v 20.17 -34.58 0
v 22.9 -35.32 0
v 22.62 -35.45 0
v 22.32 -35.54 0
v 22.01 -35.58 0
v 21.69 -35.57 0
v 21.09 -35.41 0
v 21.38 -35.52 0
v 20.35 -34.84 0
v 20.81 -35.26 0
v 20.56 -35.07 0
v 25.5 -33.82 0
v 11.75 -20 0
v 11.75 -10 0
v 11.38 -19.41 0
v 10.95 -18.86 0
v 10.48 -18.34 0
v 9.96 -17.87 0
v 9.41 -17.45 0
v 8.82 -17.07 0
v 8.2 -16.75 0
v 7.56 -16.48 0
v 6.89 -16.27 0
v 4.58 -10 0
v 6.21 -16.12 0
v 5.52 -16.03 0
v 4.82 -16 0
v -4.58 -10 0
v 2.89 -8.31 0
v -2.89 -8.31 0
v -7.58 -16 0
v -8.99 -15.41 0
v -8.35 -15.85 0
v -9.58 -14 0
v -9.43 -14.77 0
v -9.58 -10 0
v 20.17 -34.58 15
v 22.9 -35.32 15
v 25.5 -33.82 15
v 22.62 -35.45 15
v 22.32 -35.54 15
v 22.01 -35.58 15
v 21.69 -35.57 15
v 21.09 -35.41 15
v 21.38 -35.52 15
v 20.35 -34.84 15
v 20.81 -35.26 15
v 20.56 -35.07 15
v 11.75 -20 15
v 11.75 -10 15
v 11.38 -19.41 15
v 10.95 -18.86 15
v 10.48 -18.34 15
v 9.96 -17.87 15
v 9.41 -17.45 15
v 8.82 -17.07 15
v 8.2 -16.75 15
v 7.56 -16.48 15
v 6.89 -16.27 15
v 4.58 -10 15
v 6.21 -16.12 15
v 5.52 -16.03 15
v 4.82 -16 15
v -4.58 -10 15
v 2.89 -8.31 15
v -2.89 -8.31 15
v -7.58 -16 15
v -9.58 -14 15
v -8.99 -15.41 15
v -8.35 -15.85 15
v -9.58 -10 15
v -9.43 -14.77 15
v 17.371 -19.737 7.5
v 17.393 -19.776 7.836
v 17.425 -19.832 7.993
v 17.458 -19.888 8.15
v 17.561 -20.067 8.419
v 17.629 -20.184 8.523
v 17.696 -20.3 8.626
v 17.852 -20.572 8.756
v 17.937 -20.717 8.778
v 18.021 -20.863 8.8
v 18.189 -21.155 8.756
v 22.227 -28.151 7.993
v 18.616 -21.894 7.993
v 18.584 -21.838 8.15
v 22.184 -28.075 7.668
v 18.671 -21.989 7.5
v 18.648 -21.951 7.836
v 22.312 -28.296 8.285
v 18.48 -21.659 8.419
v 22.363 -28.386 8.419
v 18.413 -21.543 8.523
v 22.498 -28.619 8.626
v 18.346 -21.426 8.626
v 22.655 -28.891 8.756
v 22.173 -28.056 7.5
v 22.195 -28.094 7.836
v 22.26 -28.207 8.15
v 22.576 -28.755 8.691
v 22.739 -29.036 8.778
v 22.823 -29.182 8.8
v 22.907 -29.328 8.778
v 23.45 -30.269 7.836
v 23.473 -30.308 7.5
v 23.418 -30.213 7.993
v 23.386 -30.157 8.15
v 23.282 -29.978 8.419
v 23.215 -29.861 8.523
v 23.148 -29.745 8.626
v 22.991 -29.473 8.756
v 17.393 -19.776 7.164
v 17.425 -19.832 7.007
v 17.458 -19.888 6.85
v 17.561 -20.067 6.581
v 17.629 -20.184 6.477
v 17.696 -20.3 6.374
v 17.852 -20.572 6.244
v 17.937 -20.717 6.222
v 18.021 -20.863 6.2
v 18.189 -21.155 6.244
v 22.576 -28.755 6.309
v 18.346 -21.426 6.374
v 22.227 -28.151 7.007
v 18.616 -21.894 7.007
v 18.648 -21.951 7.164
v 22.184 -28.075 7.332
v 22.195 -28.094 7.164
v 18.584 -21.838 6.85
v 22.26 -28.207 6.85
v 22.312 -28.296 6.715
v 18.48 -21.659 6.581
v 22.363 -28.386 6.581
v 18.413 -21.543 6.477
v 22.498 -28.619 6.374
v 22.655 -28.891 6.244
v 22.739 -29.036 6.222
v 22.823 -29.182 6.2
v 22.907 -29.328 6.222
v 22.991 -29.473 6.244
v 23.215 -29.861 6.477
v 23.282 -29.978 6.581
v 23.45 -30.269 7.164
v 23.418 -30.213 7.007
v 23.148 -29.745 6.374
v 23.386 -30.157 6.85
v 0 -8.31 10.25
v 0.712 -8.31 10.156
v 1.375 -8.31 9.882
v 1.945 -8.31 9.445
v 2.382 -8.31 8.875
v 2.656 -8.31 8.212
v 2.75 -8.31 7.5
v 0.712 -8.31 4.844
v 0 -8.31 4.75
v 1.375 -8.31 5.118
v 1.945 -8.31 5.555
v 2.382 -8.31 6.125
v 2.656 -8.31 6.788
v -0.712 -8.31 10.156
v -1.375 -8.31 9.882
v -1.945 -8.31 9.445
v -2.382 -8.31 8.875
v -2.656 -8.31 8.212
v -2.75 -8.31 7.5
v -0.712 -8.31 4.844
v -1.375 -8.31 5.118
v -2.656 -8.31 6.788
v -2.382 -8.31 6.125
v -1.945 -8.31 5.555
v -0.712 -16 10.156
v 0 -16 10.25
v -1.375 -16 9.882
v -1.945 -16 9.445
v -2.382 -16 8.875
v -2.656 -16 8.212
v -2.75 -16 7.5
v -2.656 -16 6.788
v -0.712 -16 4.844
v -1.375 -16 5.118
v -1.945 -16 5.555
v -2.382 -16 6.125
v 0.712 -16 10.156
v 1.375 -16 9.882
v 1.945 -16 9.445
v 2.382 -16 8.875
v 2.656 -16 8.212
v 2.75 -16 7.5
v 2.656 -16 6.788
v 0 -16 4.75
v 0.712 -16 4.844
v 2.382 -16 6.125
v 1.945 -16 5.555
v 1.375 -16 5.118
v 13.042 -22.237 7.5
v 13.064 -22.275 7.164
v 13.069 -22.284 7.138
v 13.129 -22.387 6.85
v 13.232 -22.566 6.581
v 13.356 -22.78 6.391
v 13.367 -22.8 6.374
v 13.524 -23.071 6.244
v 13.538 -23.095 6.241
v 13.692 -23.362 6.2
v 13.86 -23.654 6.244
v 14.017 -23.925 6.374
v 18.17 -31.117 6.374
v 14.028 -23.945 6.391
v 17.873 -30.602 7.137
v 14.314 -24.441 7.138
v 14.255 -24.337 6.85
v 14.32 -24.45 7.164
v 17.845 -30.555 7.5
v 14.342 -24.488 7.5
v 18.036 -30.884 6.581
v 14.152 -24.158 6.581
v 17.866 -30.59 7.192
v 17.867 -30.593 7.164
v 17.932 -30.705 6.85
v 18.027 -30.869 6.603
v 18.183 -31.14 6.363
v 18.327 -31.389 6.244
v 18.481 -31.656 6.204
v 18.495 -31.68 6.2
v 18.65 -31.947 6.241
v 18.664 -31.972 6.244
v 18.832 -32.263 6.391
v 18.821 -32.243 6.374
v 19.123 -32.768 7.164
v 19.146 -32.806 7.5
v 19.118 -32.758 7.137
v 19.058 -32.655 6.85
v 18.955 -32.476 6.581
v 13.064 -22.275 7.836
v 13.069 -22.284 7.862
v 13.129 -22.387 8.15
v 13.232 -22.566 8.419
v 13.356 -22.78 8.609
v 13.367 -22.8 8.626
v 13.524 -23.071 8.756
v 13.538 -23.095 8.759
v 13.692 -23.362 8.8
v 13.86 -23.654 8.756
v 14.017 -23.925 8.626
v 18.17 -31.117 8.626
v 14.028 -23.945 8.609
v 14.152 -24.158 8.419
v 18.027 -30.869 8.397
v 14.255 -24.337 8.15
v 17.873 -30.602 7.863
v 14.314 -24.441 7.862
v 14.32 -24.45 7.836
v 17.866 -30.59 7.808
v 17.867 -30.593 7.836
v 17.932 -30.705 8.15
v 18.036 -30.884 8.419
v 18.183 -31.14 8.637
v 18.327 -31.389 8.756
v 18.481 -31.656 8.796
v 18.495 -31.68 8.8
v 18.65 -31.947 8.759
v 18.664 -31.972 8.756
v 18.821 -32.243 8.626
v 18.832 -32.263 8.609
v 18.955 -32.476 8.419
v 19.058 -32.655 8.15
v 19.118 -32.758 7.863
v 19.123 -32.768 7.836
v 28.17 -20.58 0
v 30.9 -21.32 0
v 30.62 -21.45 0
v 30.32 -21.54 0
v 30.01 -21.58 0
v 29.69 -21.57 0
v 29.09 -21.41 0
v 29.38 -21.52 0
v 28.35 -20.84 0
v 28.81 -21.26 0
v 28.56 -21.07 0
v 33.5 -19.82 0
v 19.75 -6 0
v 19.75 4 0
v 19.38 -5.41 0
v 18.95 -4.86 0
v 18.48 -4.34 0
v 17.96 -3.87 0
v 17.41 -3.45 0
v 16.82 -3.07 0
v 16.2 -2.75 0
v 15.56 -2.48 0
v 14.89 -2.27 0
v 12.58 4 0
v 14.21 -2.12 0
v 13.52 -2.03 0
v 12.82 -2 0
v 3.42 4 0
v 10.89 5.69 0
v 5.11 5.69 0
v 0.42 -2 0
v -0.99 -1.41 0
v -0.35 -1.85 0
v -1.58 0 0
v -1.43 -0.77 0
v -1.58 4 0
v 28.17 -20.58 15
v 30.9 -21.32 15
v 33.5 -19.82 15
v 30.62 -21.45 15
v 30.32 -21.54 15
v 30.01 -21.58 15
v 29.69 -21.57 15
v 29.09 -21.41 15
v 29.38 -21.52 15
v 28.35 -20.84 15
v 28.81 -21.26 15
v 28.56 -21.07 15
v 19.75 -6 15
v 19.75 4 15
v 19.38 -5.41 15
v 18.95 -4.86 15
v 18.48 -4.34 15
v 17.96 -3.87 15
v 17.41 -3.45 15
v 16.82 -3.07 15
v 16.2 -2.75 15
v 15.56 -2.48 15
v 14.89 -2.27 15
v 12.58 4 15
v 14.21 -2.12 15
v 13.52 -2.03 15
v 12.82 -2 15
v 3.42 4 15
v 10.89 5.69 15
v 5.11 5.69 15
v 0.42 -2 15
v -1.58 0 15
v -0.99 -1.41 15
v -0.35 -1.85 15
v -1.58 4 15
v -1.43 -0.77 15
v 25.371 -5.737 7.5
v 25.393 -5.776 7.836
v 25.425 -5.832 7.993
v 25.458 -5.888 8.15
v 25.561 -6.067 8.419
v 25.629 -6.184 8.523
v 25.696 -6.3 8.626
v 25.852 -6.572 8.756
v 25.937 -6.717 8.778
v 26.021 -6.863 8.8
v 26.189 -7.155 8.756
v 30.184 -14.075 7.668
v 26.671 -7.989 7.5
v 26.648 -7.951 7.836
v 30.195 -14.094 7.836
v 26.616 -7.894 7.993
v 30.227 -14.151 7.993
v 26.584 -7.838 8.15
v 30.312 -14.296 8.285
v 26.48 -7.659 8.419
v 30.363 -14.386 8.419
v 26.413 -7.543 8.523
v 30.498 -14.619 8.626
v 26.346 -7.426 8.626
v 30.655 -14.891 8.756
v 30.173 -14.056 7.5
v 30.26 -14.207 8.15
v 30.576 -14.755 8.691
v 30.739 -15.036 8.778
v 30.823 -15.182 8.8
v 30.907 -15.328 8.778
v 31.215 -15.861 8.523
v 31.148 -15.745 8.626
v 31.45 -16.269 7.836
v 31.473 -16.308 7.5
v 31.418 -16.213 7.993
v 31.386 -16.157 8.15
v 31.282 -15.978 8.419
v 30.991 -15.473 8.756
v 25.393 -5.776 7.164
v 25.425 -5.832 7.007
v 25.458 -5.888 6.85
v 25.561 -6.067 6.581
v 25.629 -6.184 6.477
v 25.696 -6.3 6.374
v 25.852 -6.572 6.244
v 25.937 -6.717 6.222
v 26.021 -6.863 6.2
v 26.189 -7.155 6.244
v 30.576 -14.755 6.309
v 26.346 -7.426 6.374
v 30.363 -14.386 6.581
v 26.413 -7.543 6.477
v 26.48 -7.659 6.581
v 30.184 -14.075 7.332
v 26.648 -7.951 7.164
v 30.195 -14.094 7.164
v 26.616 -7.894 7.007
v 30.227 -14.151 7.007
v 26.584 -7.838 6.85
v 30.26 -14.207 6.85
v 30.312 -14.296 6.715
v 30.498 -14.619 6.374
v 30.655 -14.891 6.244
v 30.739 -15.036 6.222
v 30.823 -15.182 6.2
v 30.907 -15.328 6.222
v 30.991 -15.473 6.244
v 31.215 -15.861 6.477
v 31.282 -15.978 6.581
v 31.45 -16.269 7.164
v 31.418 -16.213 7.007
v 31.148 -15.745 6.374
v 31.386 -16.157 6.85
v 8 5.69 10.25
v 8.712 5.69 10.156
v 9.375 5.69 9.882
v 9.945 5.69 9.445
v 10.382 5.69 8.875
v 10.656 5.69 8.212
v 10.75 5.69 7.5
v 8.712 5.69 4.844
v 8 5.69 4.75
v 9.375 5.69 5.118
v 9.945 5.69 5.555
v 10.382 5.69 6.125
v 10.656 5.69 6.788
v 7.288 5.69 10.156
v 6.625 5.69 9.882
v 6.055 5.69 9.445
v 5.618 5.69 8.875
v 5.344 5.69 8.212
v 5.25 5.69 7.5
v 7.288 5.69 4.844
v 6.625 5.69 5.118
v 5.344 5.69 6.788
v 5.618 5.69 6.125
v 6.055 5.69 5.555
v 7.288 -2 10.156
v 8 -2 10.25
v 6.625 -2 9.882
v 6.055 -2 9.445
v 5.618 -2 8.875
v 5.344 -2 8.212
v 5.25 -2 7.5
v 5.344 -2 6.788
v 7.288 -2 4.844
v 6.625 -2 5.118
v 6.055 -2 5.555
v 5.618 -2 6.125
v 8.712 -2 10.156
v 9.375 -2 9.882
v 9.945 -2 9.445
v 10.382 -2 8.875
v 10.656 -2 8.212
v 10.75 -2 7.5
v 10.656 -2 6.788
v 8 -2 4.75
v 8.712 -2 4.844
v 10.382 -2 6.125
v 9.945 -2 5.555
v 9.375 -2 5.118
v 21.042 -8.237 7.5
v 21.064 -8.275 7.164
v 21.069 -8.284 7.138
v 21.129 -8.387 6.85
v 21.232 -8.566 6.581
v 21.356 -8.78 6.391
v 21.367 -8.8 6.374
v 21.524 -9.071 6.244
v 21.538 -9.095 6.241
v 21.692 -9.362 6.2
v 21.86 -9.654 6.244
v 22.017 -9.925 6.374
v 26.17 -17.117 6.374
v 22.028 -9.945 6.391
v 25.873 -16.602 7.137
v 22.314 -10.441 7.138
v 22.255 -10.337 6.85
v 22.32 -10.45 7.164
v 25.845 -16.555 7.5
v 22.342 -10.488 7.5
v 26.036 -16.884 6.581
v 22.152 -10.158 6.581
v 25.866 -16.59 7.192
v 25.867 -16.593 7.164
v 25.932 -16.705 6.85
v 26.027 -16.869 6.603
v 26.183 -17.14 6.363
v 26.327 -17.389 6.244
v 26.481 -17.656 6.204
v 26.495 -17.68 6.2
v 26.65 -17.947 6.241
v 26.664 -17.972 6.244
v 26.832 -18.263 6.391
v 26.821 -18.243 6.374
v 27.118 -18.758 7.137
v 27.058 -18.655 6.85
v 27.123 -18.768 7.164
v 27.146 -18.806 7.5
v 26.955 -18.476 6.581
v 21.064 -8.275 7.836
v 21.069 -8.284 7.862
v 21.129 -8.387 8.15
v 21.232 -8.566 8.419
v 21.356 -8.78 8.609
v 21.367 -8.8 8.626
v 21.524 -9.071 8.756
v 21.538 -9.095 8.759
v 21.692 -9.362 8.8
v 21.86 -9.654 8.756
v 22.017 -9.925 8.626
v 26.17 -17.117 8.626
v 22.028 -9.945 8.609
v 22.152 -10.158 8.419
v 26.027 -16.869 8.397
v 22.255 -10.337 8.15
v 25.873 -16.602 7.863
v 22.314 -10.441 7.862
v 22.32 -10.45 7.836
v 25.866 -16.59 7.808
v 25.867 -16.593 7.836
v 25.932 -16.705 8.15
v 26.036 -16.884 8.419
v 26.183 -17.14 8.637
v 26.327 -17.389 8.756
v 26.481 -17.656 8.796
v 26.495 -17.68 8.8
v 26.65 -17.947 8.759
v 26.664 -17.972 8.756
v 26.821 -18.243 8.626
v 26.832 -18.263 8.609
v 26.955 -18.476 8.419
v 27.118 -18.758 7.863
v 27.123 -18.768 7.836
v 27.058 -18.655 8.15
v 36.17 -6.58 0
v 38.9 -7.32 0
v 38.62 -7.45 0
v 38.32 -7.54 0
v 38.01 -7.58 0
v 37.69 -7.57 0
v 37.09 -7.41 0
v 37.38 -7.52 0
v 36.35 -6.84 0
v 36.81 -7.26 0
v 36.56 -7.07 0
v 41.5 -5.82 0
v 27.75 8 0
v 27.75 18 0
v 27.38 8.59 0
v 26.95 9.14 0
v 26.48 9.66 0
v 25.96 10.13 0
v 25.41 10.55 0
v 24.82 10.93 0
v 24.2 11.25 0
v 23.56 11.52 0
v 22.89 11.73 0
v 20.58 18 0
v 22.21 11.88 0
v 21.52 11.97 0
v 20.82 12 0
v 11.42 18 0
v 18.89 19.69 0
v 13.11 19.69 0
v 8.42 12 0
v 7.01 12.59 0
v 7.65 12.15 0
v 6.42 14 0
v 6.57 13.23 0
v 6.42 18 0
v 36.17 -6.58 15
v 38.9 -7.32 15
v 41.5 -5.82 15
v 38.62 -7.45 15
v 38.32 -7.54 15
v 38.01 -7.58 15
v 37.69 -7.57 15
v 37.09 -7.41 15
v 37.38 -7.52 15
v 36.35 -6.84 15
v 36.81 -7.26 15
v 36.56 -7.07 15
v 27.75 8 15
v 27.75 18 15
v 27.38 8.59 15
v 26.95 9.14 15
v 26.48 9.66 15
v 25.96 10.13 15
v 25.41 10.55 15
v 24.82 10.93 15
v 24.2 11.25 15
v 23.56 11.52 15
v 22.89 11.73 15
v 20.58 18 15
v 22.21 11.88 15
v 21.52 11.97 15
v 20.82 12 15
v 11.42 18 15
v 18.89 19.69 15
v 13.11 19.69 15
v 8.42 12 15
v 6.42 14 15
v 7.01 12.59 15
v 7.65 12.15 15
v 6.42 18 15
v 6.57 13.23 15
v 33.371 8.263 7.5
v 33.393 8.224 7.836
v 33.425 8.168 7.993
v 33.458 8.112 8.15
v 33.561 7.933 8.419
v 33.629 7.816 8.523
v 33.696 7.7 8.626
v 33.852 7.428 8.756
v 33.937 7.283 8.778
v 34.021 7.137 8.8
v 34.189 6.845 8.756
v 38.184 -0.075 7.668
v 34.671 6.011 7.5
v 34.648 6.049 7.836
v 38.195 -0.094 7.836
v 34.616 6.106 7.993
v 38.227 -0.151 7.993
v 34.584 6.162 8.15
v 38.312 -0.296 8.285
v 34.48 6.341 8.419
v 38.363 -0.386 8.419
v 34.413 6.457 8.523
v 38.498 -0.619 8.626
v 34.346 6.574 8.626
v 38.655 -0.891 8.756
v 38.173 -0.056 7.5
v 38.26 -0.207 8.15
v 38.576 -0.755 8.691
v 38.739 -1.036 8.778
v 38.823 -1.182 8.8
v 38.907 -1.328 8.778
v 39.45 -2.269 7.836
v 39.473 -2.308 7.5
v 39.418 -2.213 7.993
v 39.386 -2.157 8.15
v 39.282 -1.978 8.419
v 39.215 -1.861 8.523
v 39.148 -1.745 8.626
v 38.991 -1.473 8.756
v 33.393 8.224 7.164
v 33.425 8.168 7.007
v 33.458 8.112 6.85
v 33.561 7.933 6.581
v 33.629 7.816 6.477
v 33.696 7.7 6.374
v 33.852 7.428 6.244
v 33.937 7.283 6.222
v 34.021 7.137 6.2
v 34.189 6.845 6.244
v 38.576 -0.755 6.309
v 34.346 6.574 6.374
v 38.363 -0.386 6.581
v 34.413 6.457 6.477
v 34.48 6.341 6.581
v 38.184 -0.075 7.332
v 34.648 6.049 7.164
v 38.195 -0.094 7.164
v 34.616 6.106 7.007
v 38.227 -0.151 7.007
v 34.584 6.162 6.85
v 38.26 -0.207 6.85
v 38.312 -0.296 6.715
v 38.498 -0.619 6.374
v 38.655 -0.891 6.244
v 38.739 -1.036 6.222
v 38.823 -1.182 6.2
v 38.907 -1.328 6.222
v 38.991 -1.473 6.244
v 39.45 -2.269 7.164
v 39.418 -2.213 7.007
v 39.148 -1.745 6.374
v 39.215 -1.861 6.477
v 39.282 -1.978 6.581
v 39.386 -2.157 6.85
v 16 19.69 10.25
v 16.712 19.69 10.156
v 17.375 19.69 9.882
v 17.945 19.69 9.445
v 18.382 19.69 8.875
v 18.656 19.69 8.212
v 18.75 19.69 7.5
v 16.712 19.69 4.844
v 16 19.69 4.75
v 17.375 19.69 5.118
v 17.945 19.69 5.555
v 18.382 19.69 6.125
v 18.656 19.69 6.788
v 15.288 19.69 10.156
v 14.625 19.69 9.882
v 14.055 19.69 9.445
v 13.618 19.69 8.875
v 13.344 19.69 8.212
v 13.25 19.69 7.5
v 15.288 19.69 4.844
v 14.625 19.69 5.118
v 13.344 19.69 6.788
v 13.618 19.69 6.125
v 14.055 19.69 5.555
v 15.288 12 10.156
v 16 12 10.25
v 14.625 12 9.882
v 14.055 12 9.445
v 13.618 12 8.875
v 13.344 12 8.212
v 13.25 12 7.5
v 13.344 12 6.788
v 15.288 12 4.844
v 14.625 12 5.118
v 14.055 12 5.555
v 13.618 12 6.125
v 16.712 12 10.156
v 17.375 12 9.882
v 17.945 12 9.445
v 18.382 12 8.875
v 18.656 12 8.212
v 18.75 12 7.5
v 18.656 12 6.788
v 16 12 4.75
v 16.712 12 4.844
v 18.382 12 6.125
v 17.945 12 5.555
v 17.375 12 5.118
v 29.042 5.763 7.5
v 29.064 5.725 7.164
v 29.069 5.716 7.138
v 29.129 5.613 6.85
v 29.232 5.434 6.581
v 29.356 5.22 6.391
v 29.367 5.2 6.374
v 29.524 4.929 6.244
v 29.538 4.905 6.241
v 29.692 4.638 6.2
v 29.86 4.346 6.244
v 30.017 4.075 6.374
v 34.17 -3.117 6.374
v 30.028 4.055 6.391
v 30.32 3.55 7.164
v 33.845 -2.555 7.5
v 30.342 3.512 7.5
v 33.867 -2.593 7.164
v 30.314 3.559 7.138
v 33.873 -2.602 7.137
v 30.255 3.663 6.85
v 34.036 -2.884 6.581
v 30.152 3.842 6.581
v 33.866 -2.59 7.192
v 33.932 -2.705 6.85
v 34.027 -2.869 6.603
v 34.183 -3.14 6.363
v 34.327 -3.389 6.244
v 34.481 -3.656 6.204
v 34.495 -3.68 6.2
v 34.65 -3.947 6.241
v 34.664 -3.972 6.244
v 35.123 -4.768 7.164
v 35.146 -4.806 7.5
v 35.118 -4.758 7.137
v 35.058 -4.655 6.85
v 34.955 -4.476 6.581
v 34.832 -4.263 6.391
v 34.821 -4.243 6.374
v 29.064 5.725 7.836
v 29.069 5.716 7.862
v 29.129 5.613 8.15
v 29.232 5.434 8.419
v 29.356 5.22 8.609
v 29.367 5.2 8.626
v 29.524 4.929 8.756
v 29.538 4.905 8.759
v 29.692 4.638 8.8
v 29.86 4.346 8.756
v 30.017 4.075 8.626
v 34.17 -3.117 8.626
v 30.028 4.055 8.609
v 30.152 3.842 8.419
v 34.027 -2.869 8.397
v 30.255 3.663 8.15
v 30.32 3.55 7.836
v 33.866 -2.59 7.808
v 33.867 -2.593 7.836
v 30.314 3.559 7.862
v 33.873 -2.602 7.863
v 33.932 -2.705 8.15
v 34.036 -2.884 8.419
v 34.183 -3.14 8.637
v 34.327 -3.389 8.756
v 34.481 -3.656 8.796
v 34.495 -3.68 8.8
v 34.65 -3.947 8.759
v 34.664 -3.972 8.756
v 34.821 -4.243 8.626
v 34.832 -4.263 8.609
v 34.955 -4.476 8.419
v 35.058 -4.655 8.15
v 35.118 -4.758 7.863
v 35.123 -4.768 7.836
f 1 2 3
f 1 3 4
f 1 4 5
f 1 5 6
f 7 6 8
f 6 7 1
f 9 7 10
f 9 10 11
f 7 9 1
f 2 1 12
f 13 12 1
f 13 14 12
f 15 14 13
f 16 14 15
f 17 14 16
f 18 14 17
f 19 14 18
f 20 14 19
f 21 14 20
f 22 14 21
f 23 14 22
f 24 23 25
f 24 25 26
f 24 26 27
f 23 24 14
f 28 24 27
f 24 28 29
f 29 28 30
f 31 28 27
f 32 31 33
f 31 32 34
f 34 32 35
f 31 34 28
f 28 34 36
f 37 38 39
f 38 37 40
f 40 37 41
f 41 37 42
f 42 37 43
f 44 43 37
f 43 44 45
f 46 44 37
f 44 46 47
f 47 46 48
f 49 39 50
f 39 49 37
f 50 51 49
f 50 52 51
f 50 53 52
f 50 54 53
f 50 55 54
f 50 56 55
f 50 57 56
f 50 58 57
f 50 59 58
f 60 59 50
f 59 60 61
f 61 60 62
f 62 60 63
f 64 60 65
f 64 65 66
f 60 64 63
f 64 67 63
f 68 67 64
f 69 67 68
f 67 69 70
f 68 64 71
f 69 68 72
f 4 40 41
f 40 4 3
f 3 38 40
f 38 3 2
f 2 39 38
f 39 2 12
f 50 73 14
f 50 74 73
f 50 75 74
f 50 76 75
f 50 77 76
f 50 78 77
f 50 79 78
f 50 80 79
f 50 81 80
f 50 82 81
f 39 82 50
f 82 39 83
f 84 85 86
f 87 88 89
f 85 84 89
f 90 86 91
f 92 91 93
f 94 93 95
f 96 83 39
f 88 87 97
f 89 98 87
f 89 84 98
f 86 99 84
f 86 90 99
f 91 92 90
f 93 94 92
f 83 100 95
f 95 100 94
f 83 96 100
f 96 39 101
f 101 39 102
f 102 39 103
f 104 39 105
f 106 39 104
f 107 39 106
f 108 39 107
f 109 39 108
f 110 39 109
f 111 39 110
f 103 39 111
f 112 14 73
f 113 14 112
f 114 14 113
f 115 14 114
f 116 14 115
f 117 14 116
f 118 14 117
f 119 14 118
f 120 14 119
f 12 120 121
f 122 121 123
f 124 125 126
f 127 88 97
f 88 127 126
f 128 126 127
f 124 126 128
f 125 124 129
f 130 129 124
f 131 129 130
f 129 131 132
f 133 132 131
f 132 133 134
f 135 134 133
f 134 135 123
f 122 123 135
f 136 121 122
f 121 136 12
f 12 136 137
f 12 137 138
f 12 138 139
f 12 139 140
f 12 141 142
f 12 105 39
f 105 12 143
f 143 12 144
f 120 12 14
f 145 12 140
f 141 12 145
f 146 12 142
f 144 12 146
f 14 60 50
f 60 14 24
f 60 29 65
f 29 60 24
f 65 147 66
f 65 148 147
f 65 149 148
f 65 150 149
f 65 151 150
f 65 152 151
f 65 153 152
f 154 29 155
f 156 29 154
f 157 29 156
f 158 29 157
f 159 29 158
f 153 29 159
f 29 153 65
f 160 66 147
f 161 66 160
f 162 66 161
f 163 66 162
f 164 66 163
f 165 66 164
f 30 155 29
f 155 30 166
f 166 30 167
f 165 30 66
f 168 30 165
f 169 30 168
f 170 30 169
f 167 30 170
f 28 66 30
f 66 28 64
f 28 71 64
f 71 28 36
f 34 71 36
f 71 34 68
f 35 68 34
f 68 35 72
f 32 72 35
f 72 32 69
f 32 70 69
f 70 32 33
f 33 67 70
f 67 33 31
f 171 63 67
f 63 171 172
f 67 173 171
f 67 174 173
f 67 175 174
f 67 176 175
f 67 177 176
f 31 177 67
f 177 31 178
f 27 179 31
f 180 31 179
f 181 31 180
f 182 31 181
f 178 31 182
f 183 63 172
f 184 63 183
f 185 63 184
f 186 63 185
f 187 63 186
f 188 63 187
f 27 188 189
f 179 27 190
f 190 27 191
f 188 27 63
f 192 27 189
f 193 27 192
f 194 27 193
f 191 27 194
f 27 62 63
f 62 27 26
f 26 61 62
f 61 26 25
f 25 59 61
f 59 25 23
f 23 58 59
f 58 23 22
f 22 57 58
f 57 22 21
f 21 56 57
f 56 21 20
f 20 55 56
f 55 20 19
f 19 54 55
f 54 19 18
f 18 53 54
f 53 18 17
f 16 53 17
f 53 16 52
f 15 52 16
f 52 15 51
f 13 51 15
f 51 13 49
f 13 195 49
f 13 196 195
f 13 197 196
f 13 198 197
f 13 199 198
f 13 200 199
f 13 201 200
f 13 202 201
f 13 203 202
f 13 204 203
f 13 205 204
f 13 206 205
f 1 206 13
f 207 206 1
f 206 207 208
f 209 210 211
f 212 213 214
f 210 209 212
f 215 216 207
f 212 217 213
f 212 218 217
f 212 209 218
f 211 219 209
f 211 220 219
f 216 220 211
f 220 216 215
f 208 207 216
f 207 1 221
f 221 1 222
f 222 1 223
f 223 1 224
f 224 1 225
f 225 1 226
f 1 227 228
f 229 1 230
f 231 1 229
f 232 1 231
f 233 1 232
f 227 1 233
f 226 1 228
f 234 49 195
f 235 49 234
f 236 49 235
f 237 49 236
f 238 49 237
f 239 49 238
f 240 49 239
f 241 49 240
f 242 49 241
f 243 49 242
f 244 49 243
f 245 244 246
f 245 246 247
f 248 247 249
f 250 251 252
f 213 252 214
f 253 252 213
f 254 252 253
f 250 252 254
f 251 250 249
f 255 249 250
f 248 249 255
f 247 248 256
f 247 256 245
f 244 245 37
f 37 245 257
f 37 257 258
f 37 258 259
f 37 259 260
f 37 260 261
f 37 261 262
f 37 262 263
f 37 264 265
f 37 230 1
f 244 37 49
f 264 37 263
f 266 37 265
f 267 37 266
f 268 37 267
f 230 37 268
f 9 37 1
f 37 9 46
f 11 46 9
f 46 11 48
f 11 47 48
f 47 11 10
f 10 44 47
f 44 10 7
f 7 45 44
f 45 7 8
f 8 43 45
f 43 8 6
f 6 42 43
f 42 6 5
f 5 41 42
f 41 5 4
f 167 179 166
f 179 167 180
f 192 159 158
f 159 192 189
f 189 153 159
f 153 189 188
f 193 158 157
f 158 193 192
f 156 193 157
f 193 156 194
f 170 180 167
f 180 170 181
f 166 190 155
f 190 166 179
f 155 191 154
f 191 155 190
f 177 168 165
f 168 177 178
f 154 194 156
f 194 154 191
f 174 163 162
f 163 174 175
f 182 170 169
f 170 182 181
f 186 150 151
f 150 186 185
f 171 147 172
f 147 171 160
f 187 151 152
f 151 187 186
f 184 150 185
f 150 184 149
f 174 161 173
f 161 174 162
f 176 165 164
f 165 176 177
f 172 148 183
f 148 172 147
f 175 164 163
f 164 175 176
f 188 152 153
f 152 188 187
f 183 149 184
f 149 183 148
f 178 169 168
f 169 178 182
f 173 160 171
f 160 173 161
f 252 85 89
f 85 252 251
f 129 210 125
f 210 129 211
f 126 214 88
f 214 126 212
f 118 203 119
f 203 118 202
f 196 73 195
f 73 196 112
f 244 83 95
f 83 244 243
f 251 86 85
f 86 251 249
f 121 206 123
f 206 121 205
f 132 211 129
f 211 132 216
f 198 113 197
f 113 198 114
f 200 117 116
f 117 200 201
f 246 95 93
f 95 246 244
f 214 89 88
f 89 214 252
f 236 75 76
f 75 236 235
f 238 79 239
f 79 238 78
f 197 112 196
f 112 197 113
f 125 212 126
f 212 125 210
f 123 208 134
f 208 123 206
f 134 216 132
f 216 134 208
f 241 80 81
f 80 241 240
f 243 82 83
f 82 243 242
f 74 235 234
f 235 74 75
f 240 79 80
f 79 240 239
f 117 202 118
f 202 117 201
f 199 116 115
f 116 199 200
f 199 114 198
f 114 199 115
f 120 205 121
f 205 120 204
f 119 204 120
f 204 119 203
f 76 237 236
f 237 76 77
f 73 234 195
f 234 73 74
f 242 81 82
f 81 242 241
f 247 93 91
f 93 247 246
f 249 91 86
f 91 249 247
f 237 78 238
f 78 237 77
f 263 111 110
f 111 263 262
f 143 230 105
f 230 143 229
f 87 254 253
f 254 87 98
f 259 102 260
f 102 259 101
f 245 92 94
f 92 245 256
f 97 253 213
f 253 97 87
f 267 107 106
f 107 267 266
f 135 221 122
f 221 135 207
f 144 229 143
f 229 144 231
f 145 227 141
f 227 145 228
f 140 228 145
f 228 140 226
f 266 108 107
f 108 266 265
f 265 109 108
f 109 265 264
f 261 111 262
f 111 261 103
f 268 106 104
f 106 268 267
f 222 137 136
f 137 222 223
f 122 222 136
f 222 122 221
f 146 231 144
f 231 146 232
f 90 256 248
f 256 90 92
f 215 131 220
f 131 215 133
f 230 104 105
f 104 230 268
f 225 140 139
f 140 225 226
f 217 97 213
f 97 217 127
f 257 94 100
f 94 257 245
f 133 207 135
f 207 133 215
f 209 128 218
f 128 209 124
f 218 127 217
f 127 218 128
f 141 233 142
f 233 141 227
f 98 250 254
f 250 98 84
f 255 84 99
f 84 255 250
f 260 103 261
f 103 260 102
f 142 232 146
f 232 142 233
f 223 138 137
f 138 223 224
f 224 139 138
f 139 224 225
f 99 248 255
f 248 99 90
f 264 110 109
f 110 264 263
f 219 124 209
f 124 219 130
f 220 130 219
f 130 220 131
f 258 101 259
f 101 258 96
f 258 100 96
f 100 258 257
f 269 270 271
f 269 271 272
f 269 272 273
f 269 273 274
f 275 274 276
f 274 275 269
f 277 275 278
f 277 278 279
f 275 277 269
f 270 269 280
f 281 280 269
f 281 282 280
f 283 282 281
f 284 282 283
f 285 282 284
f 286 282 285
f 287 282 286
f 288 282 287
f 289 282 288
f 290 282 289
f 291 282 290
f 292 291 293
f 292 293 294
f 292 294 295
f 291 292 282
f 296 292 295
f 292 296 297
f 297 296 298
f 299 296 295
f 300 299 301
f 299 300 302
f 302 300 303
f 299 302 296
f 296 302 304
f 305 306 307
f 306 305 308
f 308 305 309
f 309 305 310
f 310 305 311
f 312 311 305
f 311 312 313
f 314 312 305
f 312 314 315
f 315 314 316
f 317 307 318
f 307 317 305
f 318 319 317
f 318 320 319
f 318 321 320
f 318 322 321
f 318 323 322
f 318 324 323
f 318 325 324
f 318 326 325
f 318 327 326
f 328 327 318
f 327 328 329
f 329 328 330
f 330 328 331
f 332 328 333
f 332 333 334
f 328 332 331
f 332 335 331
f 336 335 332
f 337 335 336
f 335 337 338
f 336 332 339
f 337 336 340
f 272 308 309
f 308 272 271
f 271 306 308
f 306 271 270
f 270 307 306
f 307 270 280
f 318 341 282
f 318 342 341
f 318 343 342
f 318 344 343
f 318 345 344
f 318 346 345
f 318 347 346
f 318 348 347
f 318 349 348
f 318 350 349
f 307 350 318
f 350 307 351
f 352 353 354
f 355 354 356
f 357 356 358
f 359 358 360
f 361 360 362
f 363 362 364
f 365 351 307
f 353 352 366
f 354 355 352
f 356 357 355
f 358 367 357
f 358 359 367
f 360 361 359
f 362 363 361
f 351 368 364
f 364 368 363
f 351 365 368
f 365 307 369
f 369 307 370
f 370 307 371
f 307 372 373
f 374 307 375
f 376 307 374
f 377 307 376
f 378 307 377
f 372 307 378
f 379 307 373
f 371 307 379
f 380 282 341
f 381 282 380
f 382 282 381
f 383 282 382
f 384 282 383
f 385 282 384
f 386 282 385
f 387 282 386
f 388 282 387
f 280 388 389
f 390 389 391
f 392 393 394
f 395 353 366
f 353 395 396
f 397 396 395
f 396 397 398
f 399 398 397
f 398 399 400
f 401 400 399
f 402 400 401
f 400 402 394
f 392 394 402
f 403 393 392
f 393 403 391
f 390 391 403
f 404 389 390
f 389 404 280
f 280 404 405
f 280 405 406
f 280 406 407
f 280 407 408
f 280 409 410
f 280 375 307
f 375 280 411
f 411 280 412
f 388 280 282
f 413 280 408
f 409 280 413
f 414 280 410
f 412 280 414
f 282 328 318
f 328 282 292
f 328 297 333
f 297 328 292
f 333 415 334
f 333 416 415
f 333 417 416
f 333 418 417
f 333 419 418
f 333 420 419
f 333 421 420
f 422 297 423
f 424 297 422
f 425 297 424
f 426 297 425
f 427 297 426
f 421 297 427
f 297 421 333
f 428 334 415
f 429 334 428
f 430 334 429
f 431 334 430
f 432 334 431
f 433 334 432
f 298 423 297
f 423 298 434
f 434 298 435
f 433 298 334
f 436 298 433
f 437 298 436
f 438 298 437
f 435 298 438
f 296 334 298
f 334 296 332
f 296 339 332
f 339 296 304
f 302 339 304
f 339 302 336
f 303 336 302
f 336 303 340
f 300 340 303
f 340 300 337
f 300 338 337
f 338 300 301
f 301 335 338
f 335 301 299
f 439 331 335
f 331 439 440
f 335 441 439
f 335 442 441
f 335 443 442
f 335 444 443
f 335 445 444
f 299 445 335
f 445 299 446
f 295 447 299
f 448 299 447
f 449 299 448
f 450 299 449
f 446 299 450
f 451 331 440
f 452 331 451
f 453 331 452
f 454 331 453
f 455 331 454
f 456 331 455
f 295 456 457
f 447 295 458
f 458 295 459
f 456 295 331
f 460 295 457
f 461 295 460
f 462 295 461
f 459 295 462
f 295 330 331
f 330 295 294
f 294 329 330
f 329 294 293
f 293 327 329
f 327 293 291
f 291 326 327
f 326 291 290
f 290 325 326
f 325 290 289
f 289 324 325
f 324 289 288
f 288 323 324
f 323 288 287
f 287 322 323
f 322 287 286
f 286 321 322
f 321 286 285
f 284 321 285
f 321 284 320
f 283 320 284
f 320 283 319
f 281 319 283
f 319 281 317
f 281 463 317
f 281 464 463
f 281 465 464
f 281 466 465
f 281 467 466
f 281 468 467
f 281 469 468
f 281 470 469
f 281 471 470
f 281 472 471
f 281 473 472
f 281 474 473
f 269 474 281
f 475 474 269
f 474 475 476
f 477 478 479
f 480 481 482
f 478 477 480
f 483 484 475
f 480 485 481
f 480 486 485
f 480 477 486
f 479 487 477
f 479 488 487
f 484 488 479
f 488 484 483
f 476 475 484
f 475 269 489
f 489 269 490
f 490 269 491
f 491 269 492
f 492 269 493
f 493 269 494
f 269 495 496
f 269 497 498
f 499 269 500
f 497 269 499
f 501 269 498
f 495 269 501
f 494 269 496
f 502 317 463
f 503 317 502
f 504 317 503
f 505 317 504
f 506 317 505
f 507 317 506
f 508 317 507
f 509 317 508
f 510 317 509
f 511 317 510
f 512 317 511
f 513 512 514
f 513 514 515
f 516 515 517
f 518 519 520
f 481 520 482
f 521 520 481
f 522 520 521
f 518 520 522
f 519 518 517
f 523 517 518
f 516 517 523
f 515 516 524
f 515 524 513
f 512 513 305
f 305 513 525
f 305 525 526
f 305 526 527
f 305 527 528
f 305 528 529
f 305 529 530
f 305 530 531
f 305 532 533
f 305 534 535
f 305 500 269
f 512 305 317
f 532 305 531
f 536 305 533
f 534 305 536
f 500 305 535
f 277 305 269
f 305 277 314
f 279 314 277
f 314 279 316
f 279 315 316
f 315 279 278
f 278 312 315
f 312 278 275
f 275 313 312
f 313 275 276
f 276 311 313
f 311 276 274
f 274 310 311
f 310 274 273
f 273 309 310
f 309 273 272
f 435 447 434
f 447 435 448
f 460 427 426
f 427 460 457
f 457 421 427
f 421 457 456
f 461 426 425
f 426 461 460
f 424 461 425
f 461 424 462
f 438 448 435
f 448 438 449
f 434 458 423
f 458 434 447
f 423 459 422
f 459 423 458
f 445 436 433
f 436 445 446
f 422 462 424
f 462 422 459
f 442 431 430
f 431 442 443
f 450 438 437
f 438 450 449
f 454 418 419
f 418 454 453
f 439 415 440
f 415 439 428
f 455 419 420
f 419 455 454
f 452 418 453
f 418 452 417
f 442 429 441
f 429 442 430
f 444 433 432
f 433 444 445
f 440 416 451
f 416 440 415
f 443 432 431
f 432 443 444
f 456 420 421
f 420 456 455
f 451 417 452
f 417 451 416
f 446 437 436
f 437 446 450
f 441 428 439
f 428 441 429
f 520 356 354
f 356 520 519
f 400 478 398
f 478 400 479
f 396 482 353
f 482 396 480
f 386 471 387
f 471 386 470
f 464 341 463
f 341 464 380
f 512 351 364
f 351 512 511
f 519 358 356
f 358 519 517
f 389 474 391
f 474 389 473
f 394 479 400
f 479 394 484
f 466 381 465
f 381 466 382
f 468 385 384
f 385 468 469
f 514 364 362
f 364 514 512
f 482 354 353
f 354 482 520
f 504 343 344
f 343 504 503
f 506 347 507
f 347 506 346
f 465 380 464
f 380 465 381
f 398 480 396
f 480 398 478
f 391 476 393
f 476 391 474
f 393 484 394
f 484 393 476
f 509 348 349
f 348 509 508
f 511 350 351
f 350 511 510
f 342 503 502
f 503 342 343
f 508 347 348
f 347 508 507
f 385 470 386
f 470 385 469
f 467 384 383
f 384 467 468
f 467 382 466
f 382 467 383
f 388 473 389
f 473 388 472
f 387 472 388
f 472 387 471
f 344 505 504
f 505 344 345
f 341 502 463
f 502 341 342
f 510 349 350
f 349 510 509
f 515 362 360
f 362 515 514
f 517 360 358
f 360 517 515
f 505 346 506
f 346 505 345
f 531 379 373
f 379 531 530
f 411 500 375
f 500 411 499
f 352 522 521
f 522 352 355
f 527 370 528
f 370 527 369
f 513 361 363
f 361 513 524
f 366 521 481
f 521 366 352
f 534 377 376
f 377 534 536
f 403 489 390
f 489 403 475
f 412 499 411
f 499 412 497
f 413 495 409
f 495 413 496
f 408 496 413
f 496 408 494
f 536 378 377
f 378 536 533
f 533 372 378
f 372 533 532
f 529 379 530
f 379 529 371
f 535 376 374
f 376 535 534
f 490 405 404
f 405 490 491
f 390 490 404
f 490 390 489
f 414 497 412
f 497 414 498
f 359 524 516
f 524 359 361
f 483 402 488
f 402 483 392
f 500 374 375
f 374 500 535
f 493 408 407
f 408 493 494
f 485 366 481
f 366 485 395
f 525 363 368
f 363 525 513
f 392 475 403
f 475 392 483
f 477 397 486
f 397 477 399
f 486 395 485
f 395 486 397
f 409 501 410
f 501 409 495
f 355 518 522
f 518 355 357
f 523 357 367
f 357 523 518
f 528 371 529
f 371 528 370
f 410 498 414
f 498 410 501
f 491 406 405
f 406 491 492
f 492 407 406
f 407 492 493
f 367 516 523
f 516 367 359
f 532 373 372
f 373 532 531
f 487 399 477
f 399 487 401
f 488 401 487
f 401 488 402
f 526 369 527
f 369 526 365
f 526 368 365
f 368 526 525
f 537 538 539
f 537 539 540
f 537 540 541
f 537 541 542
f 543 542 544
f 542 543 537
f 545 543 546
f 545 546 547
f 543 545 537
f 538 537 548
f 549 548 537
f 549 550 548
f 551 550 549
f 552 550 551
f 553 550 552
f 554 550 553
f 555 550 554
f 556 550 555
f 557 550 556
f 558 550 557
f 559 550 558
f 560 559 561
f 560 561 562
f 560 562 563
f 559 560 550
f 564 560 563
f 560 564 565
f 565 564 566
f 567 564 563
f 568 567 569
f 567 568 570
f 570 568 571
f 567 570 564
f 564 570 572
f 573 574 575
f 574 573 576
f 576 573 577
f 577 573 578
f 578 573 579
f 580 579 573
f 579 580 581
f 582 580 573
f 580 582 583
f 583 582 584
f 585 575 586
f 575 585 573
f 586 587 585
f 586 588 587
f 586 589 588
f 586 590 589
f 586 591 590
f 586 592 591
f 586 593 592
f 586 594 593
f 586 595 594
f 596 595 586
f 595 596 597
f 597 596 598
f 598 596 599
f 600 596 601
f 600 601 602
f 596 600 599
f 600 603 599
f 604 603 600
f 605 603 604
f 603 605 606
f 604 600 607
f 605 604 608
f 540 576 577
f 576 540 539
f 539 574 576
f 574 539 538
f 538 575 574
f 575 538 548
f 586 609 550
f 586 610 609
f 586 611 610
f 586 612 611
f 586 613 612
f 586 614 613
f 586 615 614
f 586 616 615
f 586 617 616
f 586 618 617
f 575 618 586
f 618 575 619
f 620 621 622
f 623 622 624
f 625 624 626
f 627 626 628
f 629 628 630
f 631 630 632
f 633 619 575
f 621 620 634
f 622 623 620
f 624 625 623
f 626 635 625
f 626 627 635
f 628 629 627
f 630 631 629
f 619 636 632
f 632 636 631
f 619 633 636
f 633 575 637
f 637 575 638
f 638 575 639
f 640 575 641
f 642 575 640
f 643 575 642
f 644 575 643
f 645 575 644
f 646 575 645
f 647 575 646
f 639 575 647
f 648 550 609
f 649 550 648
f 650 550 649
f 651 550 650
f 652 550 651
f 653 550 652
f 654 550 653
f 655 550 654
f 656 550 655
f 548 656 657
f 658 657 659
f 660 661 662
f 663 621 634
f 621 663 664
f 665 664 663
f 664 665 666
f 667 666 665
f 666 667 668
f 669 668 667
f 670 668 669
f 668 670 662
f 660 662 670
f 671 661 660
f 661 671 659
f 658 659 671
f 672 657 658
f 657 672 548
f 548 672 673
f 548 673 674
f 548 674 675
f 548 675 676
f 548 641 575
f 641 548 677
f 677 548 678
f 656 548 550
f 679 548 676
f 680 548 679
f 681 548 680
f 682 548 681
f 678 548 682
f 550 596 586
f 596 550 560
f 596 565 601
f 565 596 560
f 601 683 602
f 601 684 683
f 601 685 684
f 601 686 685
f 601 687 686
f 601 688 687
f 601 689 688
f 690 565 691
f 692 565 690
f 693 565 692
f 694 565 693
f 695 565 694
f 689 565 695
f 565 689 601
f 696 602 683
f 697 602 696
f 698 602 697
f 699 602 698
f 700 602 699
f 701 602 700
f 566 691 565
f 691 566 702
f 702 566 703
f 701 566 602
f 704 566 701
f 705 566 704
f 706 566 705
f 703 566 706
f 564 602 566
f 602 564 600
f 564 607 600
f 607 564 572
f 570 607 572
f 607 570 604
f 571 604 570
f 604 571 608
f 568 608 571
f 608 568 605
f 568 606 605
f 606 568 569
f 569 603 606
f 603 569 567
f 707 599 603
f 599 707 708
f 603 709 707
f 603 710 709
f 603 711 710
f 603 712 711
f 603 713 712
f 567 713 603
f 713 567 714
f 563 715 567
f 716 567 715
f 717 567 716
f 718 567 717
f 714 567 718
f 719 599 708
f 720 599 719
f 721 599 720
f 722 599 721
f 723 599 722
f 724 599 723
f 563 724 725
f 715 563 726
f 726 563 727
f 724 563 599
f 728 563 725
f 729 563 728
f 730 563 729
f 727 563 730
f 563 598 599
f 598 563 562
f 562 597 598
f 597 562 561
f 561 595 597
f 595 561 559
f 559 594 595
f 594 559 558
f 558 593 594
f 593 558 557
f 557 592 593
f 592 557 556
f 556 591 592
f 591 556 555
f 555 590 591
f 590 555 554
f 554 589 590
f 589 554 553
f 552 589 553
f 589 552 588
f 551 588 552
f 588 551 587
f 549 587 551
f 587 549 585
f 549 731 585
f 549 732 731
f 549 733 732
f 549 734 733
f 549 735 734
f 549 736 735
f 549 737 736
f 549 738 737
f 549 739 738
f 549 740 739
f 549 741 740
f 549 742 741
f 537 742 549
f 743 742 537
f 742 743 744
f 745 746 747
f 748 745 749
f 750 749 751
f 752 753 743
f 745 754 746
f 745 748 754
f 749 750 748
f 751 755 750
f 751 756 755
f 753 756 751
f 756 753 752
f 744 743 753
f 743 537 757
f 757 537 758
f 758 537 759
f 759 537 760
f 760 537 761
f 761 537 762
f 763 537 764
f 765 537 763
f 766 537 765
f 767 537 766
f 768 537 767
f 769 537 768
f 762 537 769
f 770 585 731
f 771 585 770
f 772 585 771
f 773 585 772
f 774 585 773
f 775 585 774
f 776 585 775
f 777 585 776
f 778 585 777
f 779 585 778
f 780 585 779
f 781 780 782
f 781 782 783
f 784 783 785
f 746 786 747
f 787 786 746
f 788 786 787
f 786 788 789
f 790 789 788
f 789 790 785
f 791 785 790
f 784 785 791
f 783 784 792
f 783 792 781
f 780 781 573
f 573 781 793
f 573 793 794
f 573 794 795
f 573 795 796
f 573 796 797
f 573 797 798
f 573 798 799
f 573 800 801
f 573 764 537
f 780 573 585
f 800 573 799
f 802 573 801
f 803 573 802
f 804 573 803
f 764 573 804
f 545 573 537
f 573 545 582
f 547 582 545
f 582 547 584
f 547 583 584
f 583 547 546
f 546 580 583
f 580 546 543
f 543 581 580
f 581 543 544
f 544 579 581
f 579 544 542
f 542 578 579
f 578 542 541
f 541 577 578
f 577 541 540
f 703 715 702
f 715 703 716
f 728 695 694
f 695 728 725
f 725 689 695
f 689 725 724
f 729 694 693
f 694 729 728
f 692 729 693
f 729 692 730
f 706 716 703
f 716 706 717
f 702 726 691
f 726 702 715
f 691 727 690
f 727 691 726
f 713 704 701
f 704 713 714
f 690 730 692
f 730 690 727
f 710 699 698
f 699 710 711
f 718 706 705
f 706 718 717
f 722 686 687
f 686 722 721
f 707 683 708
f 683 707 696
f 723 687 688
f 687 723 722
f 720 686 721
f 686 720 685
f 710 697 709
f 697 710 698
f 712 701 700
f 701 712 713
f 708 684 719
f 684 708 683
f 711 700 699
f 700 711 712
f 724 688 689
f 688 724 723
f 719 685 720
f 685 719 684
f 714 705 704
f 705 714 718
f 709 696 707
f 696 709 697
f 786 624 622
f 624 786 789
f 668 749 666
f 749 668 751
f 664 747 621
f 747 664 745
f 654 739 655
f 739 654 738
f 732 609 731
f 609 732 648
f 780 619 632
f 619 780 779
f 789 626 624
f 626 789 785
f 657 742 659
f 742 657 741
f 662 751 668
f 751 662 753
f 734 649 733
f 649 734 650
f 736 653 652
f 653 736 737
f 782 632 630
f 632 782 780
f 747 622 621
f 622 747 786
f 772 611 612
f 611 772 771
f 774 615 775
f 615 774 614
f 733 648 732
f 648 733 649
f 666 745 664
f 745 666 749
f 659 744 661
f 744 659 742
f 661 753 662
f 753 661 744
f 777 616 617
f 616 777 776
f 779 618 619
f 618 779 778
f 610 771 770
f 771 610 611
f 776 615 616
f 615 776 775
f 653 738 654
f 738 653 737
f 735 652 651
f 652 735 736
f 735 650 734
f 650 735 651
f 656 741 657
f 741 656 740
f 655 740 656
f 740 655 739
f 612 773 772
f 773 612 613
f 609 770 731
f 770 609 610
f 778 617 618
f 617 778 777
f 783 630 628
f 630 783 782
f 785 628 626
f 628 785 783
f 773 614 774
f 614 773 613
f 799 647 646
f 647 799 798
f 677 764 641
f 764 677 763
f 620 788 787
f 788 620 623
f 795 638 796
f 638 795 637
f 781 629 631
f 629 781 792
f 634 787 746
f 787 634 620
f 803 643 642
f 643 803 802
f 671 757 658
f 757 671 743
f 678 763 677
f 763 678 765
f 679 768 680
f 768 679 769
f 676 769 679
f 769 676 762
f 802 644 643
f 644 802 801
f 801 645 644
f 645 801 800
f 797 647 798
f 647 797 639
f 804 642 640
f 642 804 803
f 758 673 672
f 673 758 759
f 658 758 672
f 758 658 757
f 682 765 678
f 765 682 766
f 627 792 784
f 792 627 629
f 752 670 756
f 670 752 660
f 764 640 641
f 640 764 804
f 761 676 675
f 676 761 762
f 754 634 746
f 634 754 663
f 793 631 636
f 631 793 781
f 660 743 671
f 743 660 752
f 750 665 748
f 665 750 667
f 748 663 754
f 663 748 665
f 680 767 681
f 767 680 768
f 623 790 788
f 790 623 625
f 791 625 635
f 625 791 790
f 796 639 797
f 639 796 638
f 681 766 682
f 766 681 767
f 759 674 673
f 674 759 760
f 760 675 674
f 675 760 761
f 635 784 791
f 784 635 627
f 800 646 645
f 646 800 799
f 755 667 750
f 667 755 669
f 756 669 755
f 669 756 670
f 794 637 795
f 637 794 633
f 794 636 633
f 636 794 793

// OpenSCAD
//Limit Switch holder for Delta - Emmett
//Orgin is at center of Aluminum 2060
//11/26/2015    By: David Bunch

Len = 20;           //Length of Switchh
Wid = 10.5;         //Width of Switch
Ht = 6.5;           //Height or thickness of Switch
$fn=24;
M5 = 5.5;           //Diameter of M5 Bolt
M5Head = 9.5;       //Daimeter of M5 Head (not used here)
M2_5 = 2.6;         //Diameter of M2.5 bolt or Wire tie holes
Holder_Ht = 15;     //Height Limit Switch Holder
Holder_Half = Holder_Ht / 2;
Qty = 3;            //1 or 3
Assembled = 0;      //1 = Show relavent Parts assembled, 0 = No
module VSlot_Holder()
{
    difference()
    {
        linear_extrude(height = Holder_Ht, center = false, convexity = 10)polygon(points = 
        [[-9.58,-14],[-9.43,-14.77],[-8.99,-15.41],[-8.35,-15.85],[-7.58,-16],
        [4.82,-16],[5.52,-16.03],[6.21,-16.12],[6.89,-16.27],[7.56,-16.48],
        [8.2,-16.75],[8.82,-17.07],[9.41,-17.45],[9.96,-17.87],[10.48,-18.34],
        [10.95,-18.86],[11.38,-19.41],[11.75,-20],[20.17,-34.58],[20.35,-34.84],
        [20.56,-35.07],[20.81,-35.26],[21.09,-35.41],[21.38,-35.52],[21.69,-35.57],
        [22.01,-35.58],[22.32,-35.54],[22.62,-35.45],[22.9,-35.32],[25.5,-33.82],
        [11.75,-10],[4.58,-10],[2.89,-8.31],[-2.89,-8.31],[-4.58,-10],
        [-9.58,-10]]);
        translate([0,-17,Holder_Half])
        rotate([-90,0,0])
        cylinder(d=M5,h=20);        //Drill hole for M5 screw into Tnut
//Drill hole for WireTies or M2.5 bolts
        translate([12.83,-23.86,Holder_Half])
        rotate([0,0,-60])
        rotate([-90,0,0])
        cylinder(d=M2_5,h=12);          //Drill hole for WireTies
        translate([17.63,-32.18,Holder_Half])
        rotate([0,0,-60])
        rotate([-90,0,0])
        cylinder(d=M2_5,h=12);          //Drill hole for WireTies
    }
}
module Pin()
{
    color("silver")
    cube([.5,4,3]);
}
module Pins3()
{
    Pin();
    translate([8,0,0])
    Pin();
    translate([16.8,0,0])
    Pin();
}
module Lever()
{
    cube([19,.5,4]);
    translate([19-2.25,-4.25,0])
    {
        color("red")
        {
            cylinder(d=4.5,h=4);
            translate([-2.25,0,0])
            cube([4.5,2.25+2,4]);
        }
    }
}
module DrawUnion()
{
    union()
    {
        cube([Len,Wid,Ht]);
        translate([1.5,10.4,2])
        Pins3();
        rotate([0,0,-5])
        translate([3,0,1])
        Lever();
    }
}
module DrawSwitch()
{
    difference()
    {
        DrawUnion();
        translate([5.3,7.7,-1])
        cylinder(d=2.5,h=8.5);
        translate([15,7.7,-1])
        cylinder(d=2.5,h=Ht+2);
    }
}
module Idler_Cap()
{
    //color("red")
    import("Idler_2holeMount_44mmHoleSpacingAssembly_rev8_repaired.stl", convexity=3);
}
module TimingBelt()
{
    color("black")
    import("TimingBelt_100mm.stl", convexity=3);
}
module Carriage()
{
    color("Orange")
    import("carriage_20x60_Rev20_repaired.stl", convexity=3);
}
module CarriageBack()
{
    rotate([0,0,180])
    color("Orange")
    import("BackPlate_20x60_Rev20_repaired.stl", convexity=3);
}
module V_Slot_2060()
{
    rotate([180,0,0])
    import("V_Slot_2060_140mm.stl", convexity=3);
}
module Vertex()
{
    translate([0,0,6])
    color("blue")
    rotate([180,0,0])
    import("VertexTop_1xEMTAtTop_SideMount_2060V_NoEars_rev43_repaired.stl", convexity=3);
}
if (Assembled == 1)
{
%V_Slot_2060();

rotate([0,0,180])
#translate([0,0,-35])
%Idler_Cap();
%Vertex();

translate([0,0,-68])
{
    translate([0,10+1.5,0])
    rotate([-90,0,0])
    Carriage();         //Measures 1.5mm clearance from Vertical 2060
    translate([0,-11.5,0])
    rotate([90,0,0])
    CarriageBack();
}

translate([0,22,-22])
rotate([-90,0,0])
TimingBelt();

translate([0,0,-50])
rotate([0,0,180])
{
    translate([15.5,-16.5,0])
    rotate([0,0,120])
    rotate([90,0,0])
    translate([-20,0,0])
    %DrawSwitch();
    
    VSlot_Holder();
}
} else {
    if (Qty == 3)
    {
        VSlot_Holder();
        translate([8,14,0])
        VSlot_Holder();
        translate([16,28,0])
        VSlot_Holder();
    } else {
        VSlot_Holder();
    }
}
